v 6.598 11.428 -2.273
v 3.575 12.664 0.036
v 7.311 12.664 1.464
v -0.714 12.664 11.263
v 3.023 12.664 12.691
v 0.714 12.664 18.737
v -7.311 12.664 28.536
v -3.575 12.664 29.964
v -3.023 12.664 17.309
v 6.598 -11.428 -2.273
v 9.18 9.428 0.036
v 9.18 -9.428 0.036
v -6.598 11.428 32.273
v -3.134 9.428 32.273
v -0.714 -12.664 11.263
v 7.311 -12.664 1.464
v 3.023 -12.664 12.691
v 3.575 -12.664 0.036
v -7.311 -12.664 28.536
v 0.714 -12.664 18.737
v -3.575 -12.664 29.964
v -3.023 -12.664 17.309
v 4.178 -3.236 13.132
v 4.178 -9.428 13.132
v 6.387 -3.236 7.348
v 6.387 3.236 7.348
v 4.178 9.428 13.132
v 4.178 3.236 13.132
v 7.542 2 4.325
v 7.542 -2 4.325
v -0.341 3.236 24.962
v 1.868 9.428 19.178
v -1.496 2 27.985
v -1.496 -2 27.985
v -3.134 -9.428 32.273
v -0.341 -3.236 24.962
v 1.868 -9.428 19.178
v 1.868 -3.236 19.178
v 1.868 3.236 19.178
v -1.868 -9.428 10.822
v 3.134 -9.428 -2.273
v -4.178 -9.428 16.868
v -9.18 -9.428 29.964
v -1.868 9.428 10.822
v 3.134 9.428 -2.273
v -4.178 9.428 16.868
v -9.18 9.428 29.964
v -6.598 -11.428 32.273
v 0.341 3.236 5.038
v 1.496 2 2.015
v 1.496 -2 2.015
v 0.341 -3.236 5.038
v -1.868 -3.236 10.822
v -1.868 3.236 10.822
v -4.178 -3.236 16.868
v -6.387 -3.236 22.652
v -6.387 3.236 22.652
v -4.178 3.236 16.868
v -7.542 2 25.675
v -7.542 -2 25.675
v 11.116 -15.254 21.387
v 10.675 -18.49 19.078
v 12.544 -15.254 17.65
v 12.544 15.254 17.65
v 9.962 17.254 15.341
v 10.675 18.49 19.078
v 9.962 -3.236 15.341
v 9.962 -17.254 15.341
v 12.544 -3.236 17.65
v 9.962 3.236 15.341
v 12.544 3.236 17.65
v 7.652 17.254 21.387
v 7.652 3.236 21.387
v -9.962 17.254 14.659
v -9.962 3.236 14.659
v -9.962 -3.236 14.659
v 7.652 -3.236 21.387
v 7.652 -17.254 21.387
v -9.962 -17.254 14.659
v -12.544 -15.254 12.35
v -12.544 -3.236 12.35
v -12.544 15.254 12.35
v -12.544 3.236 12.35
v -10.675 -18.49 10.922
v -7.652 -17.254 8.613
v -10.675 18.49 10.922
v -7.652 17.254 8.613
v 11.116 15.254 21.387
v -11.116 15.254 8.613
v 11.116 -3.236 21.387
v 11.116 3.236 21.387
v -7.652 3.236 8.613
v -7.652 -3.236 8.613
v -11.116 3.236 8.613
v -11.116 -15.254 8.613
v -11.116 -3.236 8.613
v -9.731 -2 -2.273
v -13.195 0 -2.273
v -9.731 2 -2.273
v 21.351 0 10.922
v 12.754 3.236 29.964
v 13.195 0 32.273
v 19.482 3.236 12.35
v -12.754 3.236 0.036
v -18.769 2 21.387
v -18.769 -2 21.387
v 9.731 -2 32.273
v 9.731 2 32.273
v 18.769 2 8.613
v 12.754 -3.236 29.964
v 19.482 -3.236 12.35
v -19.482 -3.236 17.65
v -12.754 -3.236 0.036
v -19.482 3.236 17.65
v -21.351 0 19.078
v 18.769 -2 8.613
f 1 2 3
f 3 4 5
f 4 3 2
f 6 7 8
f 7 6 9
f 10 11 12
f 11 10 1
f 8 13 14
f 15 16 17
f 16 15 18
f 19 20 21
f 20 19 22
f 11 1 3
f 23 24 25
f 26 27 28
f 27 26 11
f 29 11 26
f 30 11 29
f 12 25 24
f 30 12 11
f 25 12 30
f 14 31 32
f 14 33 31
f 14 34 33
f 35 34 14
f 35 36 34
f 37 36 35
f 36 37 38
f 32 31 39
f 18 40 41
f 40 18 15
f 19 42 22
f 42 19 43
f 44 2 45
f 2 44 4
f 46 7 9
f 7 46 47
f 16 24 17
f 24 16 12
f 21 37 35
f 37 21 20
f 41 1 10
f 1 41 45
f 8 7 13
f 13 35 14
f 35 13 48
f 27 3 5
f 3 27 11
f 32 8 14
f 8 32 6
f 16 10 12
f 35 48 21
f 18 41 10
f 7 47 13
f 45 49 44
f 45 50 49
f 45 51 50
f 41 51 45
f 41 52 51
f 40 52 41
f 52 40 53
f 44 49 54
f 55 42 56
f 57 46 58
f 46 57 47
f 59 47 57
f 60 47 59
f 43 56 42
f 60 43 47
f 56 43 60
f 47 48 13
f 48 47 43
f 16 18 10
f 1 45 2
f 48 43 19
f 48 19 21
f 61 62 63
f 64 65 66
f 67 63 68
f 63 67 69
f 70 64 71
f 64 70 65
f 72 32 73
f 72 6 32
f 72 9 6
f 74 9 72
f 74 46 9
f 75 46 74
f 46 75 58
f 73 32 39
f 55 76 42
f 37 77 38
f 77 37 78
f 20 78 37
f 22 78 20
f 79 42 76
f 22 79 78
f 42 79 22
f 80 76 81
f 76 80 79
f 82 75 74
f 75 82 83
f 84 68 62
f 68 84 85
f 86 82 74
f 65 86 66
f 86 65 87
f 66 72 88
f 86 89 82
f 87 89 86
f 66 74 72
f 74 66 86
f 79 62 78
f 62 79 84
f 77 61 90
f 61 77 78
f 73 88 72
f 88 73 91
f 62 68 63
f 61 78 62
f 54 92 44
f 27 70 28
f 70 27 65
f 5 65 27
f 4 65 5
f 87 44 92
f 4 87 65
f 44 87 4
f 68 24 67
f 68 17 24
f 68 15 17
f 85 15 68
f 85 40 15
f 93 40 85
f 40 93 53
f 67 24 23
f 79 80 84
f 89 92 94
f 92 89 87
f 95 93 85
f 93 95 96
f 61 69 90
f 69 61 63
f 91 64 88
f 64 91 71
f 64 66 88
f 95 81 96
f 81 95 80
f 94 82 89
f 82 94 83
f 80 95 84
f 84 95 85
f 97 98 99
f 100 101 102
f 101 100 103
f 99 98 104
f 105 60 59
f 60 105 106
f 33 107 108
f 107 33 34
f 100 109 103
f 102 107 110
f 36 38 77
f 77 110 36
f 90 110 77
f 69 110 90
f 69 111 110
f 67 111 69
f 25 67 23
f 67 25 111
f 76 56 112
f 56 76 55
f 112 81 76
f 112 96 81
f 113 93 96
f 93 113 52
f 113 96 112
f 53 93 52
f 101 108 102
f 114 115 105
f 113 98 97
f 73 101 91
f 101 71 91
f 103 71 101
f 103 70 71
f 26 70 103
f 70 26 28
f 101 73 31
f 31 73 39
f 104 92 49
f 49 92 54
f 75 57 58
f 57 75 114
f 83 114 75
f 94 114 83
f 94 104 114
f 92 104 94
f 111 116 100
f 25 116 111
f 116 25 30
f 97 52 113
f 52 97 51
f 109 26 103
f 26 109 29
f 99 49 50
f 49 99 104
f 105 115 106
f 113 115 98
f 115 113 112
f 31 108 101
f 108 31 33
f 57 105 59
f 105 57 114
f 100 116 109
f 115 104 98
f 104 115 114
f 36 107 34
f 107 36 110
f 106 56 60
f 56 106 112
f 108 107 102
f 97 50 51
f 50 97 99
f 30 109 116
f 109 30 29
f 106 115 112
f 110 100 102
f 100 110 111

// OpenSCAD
// shape height
sh = 30;
// plane width
pw = 1.5;
// wire width
bw = 3;

include <../polyhedra.scad>;

translate([0, 0, sh / 2])
    face_rotate(icosahedron)
        icosahedron2();

ivert = icosahedron[0];
iface = icosahedron[1];

ifr = face_dist(icosahedron);

module icosahedron0p() {
    poly_fill0(icosahedron, pw);
}

module icosahedron2() {
    ps = (sh - pw) / 2 / ifr;
    module h4(a, b, c, d) {
        hull() {
            translate(ivert[a] * ps) icosahedron0p();
            translate(ivert[b] * ps) icosahedron0p();
            translate(ivert[c] * ps) icosahedron0p();
            translate(ivert[d] * ps) icosahedron0p();
        }
    }
    h4(0, 1, 10, 11);
    h4(4, 5, 6, 7);
    h4(2, 3, 8, 9);
    poly_wire0(icosahedron);
}
